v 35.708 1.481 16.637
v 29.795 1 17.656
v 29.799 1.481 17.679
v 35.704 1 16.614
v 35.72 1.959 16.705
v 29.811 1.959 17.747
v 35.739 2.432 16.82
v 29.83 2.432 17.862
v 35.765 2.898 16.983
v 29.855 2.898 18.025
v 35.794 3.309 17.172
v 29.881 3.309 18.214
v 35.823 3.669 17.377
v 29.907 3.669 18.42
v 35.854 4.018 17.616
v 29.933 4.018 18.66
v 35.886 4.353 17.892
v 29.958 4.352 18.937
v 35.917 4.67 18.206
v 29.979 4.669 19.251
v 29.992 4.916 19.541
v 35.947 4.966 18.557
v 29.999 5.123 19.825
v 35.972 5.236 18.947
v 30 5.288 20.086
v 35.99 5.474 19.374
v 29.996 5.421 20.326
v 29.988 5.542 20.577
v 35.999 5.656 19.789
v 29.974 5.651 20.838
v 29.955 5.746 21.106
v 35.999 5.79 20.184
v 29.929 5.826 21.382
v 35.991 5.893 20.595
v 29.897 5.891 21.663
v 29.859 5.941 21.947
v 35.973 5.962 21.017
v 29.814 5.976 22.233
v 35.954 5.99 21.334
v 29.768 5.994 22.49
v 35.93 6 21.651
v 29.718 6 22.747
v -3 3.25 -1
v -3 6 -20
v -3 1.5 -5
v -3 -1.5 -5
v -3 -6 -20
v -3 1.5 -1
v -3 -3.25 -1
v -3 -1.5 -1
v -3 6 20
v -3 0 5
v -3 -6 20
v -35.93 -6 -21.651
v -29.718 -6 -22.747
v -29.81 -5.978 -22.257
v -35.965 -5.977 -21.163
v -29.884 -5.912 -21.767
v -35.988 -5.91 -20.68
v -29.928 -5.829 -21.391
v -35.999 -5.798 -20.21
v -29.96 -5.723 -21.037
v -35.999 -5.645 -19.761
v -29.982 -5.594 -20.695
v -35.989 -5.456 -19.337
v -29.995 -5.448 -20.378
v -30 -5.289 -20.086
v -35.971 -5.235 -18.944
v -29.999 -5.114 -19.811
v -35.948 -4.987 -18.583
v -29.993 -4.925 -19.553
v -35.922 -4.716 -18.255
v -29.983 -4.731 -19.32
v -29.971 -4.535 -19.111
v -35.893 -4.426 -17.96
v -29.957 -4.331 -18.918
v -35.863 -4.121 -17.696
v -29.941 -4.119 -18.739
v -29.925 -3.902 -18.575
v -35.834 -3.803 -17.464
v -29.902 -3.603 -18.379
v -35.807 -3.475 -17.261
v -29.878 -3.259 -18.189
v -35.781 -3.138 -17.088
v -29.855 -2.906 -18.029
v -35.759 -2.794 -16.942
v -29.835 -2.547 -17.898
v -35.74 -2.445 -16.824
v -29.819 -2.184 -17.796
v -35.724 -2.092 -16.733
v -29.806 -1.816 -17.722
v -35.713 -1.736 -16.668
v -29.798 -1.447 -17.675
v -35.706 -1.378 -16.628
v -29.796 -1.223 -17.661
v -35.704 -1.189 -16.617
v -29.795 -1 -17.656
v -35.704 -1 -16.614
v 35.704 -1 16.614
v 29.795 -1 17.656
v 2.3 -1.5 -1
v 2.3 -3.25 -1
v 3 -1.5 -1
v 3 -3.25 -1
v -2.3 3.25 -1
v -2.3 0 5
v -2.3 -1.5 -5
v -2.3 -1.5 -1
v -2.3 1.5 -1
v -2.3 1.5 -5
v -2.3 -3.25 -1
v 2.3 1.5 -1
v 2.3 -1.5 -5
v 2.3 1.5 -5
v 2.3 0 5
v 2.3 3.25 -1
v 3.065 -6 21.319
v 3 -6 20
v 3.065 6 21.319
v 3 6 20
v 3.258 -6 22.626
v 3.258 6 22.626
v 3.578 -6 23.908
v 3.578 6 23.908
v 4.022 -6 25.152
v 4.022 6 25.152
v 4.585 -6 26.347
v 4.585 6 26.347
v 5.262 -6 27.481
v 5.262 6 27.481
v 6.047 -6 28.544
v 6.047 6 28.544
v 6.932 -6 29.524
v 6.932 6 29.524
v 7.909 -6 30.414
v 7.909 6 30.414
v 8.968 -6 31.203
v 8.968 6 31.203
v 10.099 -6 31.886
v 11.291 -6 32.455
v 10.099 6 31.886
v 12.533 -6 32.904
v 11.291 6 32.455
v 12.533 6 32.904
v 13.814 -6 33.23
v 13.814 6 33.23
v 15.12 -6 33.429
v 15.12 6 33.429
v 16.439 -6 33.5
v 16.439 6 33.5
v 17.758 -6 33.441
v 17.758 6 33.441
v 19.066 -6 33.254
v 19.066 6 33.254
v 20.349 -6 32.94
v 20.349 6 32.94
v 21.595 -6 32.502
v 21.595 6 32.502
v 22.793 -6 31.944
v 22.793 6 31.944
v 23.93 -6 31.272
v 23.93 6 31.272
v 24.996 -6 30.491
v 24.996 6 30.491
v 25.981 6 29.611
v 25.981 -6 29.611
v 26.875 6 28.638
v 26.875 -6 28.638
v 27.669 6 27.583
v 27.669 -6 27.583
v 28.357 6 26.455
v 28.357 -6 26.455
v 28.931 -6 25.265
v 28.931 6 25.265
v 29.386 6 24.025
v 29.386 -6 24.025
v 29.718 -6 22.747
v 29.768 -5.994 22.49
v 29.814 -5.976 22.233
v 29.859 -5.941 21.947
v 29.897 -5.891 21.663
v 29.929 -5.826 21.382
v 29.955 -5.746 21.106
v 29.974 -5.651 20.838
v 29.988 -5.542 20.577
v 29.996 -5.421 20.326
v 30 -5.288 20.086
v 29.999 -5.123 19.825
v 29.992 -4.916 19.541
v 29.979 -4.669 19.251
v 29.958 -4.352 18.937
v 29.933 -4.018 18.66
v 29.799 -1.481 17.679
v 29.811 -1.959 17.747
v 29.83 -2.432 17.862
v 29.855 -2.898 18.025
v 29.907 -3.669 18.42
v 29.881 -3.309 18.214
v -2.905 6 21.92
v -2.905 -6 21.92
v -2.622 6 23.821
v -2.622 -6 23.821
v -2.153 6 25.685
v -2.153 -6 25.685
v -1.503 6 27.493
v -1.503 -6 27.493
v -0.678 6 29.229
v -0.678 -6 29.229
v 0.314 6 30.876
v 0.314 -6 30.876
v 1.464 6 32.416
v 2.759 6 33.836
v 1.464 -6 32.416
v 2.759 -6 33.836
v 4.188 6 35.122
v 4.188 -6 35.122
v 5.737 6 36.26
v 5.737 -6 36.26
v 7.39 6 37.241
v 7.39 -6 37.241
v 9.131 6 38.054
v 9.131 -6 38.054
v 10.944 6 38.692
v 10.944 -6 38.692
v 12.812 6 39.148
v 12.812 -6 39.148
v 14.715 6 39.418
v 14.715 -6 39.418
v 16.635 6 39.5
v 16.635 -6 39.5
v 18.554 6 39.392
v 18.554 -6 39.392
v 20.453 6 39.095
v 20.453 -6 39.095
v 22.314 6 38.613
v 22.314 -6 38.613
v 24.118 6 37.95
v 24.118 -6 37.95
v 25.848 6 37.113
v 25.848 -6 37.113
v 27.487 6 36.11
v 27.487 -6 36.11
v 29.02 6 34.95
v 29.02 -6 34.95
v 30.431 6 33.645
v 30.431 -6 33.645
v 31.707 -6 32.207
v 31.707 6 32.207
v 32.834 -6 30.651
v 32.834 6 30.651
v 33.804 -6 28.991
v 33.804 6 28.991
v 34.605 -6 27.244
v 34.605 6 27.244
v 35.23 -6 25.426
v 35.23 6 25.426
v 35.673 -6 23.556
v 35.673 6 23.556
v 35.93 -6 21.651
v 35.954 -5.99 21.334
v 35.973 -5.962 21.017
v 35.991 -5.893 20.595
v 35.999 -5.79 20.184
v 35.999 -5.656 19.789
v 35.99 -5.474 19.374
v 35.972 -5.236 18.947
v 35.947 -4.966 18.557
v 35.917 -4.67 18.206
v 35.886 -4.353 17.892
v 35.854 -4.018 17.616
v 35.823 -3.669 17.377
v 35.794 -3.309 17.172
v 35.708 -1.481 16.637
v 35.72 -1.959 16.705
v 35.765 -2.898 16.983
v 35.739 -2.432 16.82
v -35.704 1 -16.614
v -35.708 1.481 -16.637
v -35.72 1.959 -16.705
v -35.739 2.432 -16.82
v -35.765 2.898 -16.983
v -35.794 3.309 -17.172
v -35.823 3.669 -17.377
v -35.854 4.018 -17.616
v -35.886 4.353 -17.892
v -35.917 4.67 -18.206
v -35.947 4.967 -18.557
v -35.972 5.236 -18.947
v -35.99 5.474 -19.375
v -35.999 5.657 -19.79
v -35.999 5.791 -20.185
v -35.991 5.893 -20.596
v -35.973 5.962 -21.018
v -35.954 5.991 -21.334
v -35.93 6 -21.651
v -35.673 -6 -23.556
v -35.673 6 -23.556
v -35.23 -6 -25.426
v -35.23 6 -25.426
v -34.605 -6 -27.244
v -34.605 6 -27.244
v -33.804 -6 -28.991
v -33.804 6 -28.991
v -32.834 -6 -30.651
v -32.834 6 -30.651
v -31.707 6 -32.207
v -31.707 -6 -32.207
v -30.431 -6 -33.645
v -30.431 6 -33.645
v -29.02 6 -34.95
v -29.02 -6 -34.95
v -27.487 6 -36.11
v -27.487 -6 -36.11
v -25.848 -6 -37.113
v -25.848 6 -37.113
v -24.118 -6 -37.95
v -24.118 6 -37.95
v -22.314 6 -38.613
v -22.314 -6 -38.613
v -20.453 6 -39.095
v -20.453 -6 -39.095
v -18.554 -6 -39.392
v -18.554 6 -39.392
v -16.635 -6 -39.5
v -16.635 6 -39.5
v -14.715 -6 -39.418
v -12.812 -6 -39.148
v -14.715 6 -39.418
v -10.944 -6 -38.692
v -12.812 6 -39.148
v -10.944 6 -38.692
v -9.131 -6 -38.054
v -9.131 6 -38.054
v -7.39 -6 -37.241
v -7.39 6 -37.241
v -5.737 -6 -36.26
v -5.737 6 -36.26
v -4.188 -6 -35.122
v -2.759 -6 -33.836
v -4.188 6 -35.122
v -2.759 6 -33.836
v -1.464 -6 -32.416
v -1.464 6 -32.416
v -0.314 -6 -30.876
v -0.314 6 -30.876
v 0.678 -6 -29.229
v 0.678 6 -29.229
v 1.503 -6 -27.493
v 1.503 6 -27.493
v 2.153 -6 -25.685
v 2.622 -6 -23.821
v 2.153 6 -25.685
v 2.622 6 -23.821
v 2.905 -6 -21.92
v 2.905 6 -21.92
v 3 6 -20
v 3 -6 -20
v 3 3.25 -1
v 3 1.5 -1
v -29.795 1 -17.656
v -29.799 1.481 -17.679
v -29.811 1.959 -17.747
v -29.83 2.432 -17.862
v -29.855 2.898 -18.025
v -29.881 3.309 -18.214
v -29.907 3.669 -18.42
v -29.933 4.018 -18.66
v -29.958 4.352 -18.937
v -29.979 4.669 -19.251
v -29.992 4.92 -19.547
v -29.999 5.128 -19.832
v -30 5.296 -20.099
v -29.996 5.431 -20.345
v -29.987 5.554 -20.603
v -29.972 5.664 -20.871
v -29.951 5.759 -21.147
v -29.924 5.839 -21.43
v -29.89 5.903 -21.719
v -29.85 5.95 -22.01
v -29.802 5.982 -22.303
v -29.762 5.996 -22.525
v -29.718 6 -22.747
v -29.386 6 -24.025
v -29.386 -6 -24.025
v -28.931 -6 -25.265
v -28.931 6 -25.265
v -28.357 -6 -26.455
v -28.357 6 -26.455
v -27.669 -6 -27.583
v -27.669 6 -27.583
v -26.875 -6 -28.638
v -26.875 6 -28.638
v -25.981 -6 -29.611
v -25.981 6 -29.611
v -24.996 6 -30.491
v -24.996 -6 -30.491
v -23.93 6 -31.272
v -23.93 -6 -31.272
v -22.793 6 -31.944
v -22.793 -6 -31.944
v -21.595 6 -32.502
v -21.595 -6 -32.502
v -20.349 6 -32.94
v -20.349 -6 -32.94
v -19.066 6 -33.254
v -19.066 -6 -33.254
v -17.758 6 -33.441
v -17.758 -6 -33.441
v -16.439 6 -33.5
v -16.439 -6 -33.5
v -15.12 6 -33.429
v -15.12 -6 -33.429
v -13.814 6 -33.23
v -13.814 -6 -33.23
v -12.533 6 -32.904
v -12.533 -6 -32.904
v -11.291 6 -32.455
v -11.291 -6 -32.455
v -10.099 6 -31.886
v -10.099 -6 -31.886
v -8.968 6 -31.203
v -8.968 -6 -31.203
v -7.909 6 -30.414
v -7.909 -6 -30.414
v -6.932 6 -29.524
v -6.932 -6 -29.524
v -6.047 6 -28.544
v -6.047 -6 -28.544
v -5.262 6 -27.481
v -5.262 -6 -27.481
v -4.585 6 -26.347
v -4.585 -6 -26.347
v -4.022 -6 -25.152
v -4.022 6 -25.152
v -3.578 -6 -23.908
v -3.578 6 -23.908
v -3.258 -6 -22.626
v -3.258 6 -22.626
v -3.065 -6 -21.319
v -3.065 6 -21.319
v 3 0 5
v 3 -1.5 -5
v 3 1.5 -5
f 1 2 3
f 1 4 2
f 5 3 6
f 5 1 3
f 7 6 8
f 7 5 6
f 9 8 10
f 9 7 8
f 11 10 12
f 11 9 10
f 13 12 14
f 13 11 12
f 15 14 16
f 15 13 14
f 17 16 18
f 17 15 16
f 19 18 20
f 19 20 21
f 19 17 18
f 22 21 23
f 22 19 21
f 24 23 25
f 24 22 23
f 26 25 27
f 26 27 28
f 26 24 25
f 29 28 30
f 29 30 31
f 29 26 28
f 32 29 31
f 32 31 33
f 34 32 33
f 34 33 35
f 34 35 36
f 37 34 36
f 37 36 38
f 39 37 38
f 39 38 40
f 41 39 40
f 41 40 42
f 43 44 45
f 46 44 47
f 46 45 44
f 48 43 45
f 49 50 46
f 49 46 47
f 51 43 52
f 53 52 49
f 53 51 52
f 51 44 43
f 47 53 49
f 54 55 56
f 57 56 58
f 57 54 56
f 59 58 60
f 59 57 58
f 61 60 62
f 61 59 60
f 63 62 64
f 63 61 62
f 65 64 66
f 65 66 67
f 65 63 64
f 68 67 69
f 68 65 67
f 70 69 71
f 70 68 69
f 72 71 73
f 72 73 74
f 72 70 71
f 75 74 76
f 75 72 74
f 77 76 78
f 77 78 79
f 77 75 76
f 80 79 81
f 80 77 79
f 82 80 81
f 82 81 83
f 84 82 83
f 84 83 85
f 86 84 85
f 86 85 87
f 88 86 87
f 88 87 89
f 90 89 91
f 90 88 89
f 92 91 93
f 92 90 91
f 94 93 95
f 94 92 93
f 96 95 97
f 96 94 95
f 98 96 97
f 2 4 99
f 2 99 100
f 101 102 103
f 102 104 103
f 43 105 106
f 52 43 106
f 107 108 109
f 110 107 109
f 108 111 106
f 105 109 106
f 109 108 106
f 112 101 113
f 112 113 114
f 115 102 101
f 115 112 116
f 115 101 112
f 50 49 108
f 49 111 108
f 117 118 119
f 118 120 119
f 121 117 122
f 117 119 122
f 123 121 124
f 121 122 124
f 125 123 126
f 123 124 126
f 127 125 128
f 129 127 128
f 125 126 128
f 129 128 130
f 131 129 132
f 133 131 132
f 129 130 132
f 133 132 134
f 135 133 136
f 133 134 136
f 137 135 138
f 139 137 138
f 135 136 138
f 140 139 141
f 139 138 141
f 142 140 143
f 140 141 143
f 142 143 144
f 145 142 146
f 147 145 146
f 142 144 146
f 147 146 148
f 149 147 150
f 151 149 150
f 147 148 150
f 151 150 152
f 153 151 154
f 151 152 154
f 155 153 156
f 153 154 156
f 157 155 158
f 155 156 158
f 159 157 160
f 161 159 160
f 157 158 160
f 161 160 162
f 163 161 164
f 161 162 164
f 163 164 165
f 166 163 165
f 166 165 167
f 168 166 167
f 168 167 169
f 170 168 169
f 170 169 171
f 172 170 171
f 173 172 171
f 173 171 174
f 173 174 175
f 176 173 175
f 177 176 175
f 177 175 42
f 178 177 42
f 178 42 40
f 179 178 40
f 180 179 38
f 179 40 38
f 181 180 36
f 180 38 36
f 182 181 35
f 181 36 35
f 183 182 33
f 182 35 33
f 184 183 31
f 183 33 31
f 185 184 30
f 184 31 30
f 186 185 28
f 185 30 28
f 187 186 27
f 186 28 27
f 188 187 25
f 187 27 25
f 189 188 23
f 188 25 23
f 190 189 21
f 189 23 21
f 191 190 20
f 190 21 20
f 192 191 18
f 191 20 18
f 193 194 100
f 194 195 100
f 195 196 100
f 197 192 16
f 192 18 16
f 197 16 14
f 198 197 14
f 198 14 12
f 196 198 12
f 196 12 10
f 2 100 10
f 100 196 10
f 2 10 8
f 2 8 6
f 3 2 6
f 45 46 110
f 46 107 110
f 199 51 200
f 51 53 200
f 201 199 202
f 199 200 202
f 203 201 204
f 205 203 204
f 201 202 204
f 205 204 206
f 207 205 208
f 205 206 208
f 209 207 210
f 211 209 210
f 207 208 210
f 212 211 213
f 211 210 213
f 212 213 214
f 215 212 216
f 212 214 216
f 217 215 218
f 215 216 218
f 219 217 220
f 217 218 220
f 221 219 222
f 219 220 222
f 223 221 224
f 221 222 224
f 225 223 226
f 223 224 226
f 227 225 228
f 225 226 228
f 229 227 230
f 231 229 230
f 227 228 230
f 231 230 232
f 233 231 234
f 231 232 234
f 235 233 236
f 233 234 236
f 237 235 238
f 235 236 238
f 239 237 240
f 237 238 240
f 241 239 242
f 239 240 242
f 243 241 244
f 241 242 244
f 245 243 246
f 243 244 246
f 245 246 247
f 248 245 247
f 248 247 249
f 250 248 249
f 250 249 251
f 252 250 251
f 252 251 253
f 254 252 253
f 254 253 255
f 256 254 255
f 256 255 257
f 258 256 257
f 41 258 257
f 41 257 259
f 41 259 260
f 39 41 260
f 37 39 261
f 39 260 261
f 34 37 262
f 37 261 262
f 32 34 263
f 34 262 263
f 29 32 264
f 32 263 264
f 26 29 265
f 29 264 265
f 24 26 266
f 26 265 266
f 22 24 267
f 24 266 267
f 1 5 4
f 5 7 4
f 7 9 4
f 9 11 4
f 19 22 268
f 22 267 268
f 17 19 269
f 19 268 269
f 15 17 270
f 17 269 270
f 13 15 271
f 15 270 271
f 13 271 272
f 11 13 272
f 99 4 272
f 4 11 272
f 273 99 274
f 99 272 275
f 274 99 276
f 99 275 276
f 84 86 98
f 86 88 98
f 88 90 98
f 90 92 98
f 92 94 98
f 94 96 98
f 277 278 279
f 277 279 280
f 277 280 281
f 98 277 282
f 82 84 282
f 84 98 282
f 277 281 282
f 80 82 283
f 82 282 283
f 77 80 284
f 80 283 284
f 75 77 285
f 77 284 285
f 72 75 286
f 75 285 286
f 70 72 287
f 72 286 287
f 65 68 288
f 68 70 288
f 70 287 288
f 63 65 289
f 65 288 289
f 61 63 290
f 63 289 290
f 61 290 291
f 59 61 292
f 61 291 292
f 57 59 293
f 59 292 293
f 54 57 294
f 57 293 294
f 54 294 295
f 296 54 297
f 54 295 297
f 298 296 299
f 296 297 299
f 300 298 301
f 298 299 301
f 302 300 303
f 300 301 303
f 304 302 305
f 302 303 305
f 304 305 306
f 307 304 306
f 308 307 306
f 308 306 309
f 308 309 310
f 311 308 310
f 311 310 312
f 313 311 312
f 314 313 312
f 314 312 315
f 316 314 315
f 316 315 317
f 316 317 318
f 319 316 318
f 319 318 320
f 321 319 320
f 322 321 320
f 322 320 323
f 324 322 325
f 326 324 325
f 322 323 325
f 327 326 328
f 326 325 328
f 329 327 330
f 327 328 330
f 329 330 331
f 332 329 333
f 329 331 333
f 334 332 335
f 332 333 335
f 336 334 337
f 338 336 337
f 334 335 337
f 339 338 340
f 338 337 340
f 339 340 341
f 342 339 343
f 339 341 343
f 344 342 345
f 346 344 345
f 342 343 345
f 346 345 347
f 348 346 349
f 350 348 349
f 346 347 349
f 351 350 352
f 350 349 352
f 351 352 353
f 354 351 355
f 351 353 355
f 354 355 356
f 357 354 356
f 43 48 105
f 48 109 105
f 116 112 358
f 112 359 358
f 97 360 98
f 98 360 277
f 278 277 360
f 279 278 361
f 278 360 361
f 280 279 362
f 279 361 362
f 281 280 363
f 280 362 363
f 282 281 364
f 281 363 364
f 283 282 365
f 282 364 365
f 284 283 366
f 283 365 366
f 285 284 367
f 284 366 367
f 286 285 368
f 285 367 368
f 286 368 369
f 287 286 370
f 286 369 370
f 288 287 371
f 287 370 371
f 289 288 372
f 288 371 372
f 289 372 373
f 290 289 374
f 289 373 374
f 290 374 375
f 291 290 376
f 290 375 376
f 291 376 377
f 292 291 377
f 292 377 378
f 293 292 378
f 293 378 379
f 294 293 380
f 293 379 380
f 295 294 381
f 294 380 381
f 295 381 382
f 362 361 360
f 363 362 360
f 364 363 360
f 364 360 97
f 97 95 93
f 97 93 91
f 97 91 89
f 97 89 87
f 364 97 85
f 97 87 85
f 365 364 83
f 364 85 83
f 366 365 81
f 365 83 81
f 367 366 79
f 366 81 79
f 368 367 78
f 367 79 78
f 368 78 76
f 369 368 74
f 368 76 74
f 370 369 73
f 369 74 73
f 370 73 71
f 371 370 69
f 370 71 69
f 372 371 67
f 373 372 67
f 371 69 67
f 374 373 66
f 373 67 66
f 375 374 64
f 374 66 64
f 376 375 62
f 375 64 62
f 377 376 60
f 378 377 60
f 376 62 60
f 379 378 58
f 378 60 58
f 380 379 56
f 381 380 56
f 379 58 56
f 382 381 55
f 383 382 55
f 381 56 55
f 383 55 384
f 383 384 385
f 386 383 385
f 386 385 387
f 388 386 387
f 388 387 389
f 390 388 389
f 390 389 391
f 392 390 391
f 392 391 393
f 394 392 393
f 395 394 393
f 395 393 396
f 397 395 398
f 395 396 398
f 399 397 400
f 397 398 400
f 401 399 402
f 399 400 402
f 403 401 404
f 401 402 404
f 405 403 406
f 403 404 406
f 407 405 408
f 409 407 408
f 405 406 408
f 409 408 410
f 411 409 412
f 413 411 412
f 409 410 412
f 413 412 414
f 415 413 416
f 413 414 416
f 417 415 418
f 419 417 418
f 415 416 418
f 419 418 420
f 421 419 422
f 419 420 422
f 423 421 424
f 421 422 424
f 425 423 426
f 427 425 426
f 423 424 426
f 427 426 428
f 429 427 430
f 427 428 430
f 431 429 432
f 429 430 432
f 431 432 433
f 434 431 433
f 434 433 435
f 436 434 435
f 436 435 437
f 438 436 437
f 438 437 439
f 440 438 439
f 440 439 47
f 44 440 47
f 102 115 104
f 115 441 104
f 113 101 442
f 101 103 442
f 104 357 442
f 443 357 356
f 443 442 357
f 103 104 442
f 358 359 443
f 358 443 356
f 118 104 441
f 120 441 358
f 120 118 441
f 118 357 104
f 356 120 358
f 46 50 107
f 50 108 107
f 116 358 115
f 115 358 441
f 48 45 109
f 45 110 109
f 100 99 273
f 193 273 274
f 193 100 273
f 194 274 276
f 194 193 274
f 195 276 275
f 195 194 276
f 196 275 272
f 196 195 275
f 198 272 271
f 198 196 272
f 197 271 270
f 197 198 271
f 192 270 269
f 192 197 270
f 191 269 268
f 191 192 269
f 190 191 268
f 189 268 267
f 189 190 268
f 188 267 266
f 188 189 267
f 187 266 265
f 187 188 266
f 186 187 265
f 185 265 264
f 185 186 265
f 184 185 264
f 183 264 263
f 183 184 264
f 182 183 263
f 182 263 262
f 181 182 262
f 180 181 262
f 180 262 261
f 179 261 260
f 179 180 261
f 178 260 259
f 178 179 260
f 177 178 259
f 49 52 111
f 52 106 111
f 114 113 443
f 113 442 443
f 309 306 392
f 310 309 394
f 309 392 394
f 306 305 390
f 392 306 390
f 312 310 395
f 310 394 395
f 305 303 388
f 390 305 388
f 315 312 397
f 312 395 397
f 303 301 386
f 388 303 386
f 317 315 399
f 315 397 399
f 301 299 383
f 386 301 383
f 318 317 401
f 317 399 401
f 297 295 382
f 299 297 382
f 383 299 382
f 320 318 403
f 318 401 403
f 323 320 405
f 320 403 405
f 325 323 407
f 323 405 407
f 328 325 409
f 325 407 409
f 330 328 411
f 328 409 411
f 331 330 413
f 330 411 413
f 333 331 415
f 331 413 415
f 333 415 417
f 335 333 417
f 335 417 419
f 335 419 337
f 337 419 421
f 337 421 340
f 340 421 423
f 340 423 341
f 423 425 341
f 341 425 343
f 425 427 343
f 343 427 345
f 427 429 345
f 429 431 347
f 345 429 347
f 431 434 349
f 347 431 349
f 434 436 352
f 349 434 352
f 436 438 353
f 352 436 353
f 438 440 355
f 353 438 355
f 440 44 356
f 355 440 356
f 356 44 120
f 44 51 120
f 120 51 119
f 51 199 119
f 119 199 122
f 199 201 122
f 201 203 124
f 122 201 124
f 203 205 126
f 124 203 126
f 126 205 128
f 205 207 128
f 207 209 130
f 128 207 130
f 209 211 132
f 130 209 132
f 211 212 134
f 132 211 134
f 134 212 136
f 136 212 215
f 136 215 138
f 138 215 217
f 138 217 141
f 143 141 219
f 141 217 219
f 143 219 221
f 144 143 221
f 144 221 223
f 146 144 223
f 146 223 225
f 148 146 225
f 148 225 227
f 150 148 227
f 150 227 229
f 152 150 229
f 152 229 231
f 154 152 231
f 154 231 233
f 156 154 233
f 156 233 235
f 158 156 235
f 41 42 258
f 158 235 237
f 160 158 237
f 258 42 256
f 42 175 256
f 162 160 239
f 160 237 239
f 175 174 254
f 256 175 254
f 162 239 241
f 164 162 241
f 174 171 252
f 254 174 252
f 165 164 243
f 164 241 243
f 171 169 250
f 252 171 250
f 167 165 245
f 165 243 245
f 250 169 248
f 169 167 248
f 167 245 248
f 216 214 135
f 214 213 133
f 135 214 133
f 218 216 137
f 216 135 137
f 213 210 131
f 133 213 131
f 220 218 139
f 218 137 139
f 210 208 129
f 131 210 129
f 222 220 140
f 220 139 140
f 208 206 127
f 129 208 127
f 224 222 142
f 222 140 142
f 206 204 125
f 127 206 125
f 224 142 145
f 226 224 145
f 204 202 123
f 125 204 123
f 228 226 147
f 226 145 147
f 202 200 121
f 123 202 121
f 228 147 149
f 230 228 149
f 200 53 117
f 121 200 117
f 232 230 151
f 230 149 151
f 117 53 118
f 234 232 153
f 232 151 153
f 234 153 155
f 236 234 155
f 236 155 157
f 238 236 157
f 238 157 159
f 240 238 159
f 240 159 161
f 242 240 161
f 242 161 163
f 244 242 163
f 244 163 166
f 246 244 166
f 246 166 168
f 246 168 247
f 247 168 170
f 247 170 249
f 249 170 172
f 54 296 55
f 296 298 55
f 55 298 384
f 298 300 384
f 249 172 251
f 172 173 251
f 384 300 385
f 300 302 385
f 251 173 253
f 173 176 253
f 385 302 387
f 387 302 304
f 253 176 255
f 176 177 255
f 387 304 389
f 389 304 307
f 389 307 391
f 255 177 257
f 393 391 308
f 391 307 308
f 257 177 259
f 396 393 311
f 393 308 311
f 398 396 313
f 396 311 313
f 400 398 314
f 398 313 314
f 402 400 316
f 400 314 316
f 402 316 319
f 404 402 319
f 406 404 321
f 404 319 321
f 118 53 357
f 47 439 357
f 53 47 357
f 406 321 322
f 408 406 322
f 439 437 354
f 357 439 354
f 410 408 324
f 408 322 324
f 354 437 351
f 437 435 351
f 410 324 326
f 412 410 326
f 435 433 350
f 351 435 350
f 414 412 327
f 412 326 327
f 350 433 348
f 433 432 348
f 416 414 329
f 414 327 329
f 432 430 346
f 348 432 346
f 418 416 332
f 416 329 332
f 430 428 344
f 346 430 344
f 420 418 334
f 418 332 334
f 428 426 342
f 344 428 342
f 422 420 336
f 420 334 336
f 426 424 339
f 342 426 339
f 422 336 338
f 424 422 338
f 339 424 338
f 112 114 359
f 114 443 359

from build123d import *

# Parameters (mm, degrees)
SKETCH003_W       = 6
SKETCH003_H       = 12
POCKET_DEPTH      = 36.001
POCKET_DEPTH_BACK = 36.001
FILLET_R          = 5
PAD_DEPTH         = 2.3


with BuildPart() as part:
    # AdditivePipe: sweep along a path in Sketch
    with BuildLine(Plane.XZ) as additivepipe_path:
        ThreePointArc((-32.749328, -17.134805), (-17.93807, -36.437213), (0, -20))
        Line((0, -20), (0, 20))
        ThreePointArc((0, 20), (17.93807, 36.437213), (32.749328, 17.134805))
    # Sketch003 → AdditivePipe (sweep)
    with BuildSketch(Plane.XY):
        Rectangle(SKETCH003_W, SKETCH003_H)
    sweep(path=additivepipe_path.line)

    # Sketch002 → Pocket (cut, two sides)
    with BuildSketch(Plane.YZ) as pocket_sk:
        Polygon((3.25, -1), (0, 5), (-3.25, -1), (-1.5, -1), (-1.5, -5), (1.5, -5), (1.5, -1), align=None)
    extrude(amount=-POCKET_DEPTH, mode=Mode.SUBTRACT)
    extrude(pocket_sk.sketch, amount=POCKET_DEPTH_BACK, mode=Mode.SUBTRACT)

    # Fillet
    fillet_edges = [part.edges().sort_by_distance(p)[0] for p in [
        (32.749328, 6, 17.134805),
        (32.749328, -6, 17.134805),
        (-32.749328, -6, -17.134805),
        (-32.749328, 6, -17.134805),
    ]]
    fillet(fillet_edges, radius=FILLET_R)

    # Sketch002 → Pad (join, symmetric)
    with BuildSketch(Plane.YZ):
        Polygon((3.25, -1), (0, 5), (-3.25, -1), (-1.5, -1), (-1.5, -5), (1.5, -5), (1.5, -1), align=None)
    extrude(amount=PAD_DEPTH, both=True)


solid = part.part
